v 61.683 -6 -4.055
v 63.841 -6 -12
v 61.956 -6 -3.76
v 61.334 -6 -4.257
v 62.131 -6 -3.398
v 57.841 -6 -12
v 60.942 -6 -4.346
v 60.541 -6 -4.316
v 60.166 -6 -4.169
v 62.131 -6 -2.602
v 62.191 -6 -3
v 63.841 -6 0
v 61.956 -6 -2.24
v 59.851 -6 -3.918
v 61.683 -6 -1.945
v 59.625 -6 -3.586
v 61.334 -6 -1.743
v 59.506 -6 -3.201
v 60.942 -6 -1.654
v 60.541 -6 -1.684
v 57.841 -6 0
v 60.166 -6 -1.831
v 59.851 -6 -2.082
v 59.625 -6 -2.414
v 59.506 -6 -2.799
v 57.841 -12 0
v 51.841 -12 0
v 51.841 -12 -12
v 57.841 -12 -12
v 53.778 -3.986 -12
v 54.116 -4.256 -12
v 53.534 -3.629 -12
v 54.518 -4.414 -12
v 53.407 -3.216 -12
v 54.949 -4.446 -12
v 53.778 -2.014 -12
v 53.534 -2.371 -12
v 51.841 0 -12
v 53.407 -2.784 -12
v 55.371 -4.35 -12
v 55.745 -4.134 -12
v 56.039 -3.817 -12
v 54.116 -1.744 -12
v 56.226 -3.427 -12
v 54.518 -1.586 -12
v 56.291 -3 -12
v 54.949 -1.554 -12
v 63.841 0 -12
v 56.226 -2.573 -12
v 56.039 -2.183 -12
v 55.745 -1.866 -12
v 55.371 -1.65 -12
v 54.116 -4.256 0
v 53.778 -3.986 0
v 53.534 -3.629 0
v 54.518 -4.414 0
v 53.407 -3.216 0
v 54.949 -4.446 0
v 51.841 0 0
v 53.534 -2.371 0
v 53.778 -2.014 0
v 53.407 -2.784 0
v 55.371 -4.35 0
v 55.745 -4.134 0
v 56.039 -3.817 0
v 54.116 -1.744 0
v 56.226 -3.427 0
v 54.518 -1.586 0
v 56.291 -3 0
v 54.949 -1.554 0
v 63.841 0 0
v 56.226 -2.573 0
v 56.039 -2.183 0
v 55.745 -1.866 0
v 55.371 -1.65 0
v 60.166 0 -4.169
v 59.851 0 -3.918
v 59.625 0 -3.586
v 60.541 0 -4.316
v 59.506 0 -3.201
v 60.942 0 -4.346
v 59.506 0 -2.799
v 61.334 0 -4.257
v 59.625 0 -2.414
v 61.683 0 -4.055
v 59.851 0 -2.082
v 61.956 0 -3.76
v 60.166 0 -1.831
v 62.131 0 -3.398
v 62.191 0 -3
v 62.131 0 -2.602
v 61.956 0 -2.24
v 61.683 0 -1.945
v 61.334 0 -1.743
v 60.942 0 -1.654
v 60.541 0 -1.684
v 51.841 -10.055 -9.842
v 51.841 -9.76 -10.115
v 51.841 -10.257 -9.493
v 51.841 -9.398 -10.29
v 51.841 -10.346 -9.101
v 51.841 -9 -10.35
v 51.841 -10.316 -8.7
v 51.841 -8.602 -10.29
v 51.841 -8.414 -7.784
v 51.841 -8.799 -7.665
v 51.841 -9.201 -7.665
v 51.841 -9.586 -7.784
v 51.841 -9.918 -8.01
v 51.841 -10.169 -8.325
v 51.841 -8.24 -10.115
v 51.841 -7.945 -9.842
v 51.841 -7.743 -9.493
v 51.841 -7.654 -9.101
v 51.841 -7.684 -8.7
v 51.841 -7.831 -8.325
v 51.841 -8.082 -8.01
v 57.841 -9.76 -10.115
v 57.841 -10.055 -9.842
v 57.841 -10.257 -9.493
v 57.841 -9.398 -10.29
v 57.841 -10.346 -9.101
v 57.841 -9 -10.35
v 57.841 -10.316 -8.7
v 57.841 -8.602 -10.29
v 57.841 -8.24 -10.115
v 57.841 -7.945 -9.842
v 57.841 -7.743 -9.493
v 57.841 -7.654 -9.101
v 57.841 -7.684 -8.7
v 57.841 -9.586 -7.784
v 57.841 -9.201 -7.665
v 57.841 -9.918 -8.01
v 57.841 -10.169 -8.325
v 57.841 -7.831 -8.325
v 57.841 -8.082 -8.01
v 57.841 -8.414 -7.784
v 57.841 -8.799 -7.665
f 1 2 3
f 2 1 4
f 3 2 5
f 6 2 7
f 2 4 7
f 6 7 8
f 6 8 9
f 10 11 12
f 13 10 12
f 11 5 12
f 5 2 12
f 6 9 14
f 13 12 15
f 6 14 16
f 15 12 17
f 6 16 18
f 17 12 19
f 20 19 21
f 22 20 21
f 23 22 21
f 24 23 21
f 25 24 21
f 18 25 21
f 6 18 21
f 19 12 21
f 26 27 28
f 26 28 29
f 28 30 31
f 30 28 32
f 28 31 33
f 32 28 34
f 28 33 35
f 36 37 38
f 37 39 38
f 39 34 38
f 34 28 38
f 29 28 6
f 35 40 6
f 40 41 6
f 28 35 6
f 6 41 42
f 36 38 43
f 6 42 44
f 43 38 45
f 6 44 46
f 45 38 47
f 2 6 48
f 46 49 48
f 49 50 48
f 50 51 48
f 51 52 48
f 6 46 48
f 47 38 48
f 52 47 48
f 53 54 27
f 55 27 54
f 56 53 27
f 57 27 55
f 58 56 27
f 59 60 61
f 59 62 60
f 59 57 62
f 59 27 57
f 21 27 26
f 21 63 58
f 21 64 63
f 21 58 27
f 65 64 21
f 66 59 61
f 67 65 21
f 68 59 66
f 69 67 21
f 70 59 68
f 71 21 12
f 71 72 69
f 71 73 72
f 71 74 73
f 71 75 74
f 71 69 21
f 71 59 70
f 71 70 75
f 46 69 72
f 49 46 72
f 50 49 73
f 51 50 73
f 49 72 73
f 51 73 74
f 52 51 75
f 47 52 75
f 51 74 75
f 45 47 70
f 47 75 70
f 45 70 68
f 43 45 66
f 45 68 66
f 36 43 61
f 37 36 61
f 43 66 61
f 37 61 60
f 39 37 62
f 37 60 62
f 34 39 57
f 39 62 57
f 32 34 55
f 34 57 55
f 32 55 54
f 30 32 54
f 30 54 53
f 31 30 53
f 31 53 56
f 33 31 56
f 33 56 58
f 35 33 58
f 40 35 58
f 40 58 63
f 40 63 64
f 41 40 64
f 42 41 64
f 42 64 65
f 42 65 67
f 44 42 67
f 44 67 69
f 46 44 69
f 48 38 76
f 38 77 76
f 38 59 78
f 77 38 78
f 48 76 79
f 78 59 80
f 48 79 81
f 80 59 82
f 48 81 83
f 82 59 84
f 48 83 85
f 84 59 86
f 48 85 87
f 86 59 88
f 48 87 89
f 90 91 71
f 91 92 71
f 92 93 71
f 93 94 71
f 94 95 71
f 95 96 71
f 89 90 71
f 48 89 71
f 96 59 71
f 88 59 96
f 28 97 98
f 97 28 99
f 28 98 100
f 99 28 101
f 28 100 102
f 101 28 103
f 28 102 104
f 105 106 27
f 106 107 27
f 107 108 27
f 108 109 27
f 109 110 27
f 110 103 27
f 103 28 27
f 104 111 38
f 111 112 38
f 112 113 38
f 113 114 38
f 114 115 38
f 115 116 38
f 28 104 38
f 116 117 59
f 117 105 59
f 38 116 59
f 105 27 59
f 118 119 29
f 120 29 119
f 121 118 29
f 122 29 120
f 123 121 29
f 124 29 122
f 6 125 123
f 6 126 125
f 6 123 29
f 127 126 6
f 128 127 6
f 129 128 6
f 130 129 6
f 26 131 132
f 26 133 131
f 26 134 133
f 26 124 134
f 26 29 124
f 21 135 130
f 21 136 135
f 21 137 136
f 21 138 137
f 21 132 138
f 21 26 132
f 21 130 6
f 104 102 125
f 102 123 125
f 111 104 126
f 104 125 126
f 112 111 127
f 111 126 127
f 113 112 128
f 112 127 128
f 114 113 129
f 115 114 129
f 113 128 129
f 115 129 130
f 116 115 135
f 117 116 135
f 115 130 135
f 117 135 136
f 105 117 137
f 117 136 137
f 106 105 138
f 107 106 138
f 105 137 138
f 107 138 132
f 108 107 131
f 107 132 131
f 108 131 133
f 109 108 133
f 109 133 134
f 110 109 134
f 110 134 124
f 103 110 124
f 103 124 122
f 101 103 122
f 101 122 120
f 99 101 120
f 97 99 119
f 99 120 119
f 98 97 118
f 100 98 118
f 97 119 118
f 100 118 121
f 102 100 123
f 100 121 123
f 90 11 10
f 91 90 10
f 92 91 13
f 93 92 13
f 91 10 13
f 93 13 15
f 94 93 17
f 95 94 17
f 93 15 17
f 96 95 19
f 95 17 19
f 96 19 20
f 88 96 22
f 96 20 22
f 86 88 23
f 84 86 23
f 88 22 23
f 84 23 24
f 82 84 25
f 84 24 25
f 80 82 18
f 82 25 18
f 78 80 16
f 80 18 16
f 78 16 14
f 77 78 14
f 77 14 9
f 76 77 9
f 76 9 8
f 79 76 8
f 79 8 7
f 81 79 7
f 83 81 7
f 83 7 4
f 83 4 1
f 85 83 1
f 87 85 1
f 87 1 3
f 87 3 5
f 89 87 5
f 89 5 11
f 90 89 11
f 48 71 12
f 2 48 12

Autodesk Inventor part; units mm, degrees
ref_plane "YZ Plane" through (0, 0, 0) normal (1, 0, 0) x (0, 1, 0)
ref_plane "XZ Plane" through (0, 0, 0) normal (0, 1, 0) x (-1, 0, 0)
ref_plane "XY Plane" through (0, 0, 0) normal (0, 0, 1) x (1, 0, 0)
sketch "스케치1" plane through (0, 0, 0) normal (0, 0, 1) x (1, 0, 0)
  line L0 (0, 0) -> (63.841, 0) projected
  line L1 (63.841, 0) -> (63.841, 6) projected
  line L2 (0, 6) -> (63.841, 6) projected
  line L3 (0, 0) -> (0, 6) projected
  line L4 (46.0408, 0) -> (46.0408, -150) projected
  line L5 (46.0408, -150) -> (51.8408, -150) projected
  line L6 (51.8408, -150) -> (51.8408, 0) projected
  line L7 (51.8408, 0) -> (46.0408, 0) projected
  line L8 (51.8408, 0) -> (63.841, 0)
  line L9 (63.841, 0) -> (63.841, -6)
  line L10 (63.841, -6) -> (51.8408, -6)
  line L11 (51.8408, -6) -> (51.8408, 0)
  line L12 (57.8409, 0) -> (51.8408, 0)
  line L13 (51.8408, 0) -> (51.8408, -12)
  line L14 (51.8408, -12) -> (57.8409, -12)
  line L15 (57.8409, -12) -> (57.8409, 0)
  point P0 (57.8409, -6)
extrude "돌출1" add sketch "스케치1" against normal blind 12 contours L0 L15 L10 L6 | L0 L9 L10 L15 | L10 L15 L14 L6
sketch "스케치2" plane through (0, 0, 0) normal (0, 0, 1) x (1, 0, 0)
  line L0 (63.841, -6) -> (57.8409, -6) projected
  line L1 (51.8408, 0) -> (63.841, 0) projected
  line L2 (57.8409, -6) -> (51.8408, -6)
  line L3 (51.8408, -6) -> (51.8408, 0)
  line L4 (51.8408, 0) -> (57.8409, 0)
  line L5 (57.8409, 0) -> (57.8409, -6)
  circle A0 centre (54.8408, -3) radius 1.45
  point P0 (0, 0)
extrude "돌출2" cut sketch "스케치2" against normal up to next contours A0
sketch "스케치3" plane through (57.8409, -6, 0) normal (0, -1, 0) x (1, 0, 0)
  line L0 (6.0001, 0) -> (-6.0001, 0) projected
  line L1 (0, 0) -> (0, -12) projected
  line L2 (6.0001, 0) -> (0, 0)
  line L3 (0, 0) -> (0, -6)
  line L4 (0, -6) -> (6.0001, -6)
  line L5 (6.0001, -6) -> (6.0001, 0)
  circle A0 centre (3.0001, -3) radius 1.35
  point P0 (-57.8409, 0)
  dimension "d6" = 2.7
extrude "돌출3" cut sketch "스케치3" against normal up to next contours A0
sketch "스케치4" plane through (57.8409, -12, 0) normal (1, 0, 0) x (0, 0, -1)
  line L0 (12, 6) -> (12, 0) projected
  line L1 (0, 6) -> (12, 6) projected
  line L2 (12, 0) -> (6, 0)
  line L3 (6, 0) -> (6, 6)
  line L4 (6, 6) -> (12, 6)
  line L5 (12, 6) -> (12, 0)
  circle A0 centre (9, 3) radius 1.35
  point P0 (0, 12)
  dimension "d9" = 2.7
extrude "돌출4" cut sketch "스케치4" against normal up to next contours A0
properties part number "부품75"
